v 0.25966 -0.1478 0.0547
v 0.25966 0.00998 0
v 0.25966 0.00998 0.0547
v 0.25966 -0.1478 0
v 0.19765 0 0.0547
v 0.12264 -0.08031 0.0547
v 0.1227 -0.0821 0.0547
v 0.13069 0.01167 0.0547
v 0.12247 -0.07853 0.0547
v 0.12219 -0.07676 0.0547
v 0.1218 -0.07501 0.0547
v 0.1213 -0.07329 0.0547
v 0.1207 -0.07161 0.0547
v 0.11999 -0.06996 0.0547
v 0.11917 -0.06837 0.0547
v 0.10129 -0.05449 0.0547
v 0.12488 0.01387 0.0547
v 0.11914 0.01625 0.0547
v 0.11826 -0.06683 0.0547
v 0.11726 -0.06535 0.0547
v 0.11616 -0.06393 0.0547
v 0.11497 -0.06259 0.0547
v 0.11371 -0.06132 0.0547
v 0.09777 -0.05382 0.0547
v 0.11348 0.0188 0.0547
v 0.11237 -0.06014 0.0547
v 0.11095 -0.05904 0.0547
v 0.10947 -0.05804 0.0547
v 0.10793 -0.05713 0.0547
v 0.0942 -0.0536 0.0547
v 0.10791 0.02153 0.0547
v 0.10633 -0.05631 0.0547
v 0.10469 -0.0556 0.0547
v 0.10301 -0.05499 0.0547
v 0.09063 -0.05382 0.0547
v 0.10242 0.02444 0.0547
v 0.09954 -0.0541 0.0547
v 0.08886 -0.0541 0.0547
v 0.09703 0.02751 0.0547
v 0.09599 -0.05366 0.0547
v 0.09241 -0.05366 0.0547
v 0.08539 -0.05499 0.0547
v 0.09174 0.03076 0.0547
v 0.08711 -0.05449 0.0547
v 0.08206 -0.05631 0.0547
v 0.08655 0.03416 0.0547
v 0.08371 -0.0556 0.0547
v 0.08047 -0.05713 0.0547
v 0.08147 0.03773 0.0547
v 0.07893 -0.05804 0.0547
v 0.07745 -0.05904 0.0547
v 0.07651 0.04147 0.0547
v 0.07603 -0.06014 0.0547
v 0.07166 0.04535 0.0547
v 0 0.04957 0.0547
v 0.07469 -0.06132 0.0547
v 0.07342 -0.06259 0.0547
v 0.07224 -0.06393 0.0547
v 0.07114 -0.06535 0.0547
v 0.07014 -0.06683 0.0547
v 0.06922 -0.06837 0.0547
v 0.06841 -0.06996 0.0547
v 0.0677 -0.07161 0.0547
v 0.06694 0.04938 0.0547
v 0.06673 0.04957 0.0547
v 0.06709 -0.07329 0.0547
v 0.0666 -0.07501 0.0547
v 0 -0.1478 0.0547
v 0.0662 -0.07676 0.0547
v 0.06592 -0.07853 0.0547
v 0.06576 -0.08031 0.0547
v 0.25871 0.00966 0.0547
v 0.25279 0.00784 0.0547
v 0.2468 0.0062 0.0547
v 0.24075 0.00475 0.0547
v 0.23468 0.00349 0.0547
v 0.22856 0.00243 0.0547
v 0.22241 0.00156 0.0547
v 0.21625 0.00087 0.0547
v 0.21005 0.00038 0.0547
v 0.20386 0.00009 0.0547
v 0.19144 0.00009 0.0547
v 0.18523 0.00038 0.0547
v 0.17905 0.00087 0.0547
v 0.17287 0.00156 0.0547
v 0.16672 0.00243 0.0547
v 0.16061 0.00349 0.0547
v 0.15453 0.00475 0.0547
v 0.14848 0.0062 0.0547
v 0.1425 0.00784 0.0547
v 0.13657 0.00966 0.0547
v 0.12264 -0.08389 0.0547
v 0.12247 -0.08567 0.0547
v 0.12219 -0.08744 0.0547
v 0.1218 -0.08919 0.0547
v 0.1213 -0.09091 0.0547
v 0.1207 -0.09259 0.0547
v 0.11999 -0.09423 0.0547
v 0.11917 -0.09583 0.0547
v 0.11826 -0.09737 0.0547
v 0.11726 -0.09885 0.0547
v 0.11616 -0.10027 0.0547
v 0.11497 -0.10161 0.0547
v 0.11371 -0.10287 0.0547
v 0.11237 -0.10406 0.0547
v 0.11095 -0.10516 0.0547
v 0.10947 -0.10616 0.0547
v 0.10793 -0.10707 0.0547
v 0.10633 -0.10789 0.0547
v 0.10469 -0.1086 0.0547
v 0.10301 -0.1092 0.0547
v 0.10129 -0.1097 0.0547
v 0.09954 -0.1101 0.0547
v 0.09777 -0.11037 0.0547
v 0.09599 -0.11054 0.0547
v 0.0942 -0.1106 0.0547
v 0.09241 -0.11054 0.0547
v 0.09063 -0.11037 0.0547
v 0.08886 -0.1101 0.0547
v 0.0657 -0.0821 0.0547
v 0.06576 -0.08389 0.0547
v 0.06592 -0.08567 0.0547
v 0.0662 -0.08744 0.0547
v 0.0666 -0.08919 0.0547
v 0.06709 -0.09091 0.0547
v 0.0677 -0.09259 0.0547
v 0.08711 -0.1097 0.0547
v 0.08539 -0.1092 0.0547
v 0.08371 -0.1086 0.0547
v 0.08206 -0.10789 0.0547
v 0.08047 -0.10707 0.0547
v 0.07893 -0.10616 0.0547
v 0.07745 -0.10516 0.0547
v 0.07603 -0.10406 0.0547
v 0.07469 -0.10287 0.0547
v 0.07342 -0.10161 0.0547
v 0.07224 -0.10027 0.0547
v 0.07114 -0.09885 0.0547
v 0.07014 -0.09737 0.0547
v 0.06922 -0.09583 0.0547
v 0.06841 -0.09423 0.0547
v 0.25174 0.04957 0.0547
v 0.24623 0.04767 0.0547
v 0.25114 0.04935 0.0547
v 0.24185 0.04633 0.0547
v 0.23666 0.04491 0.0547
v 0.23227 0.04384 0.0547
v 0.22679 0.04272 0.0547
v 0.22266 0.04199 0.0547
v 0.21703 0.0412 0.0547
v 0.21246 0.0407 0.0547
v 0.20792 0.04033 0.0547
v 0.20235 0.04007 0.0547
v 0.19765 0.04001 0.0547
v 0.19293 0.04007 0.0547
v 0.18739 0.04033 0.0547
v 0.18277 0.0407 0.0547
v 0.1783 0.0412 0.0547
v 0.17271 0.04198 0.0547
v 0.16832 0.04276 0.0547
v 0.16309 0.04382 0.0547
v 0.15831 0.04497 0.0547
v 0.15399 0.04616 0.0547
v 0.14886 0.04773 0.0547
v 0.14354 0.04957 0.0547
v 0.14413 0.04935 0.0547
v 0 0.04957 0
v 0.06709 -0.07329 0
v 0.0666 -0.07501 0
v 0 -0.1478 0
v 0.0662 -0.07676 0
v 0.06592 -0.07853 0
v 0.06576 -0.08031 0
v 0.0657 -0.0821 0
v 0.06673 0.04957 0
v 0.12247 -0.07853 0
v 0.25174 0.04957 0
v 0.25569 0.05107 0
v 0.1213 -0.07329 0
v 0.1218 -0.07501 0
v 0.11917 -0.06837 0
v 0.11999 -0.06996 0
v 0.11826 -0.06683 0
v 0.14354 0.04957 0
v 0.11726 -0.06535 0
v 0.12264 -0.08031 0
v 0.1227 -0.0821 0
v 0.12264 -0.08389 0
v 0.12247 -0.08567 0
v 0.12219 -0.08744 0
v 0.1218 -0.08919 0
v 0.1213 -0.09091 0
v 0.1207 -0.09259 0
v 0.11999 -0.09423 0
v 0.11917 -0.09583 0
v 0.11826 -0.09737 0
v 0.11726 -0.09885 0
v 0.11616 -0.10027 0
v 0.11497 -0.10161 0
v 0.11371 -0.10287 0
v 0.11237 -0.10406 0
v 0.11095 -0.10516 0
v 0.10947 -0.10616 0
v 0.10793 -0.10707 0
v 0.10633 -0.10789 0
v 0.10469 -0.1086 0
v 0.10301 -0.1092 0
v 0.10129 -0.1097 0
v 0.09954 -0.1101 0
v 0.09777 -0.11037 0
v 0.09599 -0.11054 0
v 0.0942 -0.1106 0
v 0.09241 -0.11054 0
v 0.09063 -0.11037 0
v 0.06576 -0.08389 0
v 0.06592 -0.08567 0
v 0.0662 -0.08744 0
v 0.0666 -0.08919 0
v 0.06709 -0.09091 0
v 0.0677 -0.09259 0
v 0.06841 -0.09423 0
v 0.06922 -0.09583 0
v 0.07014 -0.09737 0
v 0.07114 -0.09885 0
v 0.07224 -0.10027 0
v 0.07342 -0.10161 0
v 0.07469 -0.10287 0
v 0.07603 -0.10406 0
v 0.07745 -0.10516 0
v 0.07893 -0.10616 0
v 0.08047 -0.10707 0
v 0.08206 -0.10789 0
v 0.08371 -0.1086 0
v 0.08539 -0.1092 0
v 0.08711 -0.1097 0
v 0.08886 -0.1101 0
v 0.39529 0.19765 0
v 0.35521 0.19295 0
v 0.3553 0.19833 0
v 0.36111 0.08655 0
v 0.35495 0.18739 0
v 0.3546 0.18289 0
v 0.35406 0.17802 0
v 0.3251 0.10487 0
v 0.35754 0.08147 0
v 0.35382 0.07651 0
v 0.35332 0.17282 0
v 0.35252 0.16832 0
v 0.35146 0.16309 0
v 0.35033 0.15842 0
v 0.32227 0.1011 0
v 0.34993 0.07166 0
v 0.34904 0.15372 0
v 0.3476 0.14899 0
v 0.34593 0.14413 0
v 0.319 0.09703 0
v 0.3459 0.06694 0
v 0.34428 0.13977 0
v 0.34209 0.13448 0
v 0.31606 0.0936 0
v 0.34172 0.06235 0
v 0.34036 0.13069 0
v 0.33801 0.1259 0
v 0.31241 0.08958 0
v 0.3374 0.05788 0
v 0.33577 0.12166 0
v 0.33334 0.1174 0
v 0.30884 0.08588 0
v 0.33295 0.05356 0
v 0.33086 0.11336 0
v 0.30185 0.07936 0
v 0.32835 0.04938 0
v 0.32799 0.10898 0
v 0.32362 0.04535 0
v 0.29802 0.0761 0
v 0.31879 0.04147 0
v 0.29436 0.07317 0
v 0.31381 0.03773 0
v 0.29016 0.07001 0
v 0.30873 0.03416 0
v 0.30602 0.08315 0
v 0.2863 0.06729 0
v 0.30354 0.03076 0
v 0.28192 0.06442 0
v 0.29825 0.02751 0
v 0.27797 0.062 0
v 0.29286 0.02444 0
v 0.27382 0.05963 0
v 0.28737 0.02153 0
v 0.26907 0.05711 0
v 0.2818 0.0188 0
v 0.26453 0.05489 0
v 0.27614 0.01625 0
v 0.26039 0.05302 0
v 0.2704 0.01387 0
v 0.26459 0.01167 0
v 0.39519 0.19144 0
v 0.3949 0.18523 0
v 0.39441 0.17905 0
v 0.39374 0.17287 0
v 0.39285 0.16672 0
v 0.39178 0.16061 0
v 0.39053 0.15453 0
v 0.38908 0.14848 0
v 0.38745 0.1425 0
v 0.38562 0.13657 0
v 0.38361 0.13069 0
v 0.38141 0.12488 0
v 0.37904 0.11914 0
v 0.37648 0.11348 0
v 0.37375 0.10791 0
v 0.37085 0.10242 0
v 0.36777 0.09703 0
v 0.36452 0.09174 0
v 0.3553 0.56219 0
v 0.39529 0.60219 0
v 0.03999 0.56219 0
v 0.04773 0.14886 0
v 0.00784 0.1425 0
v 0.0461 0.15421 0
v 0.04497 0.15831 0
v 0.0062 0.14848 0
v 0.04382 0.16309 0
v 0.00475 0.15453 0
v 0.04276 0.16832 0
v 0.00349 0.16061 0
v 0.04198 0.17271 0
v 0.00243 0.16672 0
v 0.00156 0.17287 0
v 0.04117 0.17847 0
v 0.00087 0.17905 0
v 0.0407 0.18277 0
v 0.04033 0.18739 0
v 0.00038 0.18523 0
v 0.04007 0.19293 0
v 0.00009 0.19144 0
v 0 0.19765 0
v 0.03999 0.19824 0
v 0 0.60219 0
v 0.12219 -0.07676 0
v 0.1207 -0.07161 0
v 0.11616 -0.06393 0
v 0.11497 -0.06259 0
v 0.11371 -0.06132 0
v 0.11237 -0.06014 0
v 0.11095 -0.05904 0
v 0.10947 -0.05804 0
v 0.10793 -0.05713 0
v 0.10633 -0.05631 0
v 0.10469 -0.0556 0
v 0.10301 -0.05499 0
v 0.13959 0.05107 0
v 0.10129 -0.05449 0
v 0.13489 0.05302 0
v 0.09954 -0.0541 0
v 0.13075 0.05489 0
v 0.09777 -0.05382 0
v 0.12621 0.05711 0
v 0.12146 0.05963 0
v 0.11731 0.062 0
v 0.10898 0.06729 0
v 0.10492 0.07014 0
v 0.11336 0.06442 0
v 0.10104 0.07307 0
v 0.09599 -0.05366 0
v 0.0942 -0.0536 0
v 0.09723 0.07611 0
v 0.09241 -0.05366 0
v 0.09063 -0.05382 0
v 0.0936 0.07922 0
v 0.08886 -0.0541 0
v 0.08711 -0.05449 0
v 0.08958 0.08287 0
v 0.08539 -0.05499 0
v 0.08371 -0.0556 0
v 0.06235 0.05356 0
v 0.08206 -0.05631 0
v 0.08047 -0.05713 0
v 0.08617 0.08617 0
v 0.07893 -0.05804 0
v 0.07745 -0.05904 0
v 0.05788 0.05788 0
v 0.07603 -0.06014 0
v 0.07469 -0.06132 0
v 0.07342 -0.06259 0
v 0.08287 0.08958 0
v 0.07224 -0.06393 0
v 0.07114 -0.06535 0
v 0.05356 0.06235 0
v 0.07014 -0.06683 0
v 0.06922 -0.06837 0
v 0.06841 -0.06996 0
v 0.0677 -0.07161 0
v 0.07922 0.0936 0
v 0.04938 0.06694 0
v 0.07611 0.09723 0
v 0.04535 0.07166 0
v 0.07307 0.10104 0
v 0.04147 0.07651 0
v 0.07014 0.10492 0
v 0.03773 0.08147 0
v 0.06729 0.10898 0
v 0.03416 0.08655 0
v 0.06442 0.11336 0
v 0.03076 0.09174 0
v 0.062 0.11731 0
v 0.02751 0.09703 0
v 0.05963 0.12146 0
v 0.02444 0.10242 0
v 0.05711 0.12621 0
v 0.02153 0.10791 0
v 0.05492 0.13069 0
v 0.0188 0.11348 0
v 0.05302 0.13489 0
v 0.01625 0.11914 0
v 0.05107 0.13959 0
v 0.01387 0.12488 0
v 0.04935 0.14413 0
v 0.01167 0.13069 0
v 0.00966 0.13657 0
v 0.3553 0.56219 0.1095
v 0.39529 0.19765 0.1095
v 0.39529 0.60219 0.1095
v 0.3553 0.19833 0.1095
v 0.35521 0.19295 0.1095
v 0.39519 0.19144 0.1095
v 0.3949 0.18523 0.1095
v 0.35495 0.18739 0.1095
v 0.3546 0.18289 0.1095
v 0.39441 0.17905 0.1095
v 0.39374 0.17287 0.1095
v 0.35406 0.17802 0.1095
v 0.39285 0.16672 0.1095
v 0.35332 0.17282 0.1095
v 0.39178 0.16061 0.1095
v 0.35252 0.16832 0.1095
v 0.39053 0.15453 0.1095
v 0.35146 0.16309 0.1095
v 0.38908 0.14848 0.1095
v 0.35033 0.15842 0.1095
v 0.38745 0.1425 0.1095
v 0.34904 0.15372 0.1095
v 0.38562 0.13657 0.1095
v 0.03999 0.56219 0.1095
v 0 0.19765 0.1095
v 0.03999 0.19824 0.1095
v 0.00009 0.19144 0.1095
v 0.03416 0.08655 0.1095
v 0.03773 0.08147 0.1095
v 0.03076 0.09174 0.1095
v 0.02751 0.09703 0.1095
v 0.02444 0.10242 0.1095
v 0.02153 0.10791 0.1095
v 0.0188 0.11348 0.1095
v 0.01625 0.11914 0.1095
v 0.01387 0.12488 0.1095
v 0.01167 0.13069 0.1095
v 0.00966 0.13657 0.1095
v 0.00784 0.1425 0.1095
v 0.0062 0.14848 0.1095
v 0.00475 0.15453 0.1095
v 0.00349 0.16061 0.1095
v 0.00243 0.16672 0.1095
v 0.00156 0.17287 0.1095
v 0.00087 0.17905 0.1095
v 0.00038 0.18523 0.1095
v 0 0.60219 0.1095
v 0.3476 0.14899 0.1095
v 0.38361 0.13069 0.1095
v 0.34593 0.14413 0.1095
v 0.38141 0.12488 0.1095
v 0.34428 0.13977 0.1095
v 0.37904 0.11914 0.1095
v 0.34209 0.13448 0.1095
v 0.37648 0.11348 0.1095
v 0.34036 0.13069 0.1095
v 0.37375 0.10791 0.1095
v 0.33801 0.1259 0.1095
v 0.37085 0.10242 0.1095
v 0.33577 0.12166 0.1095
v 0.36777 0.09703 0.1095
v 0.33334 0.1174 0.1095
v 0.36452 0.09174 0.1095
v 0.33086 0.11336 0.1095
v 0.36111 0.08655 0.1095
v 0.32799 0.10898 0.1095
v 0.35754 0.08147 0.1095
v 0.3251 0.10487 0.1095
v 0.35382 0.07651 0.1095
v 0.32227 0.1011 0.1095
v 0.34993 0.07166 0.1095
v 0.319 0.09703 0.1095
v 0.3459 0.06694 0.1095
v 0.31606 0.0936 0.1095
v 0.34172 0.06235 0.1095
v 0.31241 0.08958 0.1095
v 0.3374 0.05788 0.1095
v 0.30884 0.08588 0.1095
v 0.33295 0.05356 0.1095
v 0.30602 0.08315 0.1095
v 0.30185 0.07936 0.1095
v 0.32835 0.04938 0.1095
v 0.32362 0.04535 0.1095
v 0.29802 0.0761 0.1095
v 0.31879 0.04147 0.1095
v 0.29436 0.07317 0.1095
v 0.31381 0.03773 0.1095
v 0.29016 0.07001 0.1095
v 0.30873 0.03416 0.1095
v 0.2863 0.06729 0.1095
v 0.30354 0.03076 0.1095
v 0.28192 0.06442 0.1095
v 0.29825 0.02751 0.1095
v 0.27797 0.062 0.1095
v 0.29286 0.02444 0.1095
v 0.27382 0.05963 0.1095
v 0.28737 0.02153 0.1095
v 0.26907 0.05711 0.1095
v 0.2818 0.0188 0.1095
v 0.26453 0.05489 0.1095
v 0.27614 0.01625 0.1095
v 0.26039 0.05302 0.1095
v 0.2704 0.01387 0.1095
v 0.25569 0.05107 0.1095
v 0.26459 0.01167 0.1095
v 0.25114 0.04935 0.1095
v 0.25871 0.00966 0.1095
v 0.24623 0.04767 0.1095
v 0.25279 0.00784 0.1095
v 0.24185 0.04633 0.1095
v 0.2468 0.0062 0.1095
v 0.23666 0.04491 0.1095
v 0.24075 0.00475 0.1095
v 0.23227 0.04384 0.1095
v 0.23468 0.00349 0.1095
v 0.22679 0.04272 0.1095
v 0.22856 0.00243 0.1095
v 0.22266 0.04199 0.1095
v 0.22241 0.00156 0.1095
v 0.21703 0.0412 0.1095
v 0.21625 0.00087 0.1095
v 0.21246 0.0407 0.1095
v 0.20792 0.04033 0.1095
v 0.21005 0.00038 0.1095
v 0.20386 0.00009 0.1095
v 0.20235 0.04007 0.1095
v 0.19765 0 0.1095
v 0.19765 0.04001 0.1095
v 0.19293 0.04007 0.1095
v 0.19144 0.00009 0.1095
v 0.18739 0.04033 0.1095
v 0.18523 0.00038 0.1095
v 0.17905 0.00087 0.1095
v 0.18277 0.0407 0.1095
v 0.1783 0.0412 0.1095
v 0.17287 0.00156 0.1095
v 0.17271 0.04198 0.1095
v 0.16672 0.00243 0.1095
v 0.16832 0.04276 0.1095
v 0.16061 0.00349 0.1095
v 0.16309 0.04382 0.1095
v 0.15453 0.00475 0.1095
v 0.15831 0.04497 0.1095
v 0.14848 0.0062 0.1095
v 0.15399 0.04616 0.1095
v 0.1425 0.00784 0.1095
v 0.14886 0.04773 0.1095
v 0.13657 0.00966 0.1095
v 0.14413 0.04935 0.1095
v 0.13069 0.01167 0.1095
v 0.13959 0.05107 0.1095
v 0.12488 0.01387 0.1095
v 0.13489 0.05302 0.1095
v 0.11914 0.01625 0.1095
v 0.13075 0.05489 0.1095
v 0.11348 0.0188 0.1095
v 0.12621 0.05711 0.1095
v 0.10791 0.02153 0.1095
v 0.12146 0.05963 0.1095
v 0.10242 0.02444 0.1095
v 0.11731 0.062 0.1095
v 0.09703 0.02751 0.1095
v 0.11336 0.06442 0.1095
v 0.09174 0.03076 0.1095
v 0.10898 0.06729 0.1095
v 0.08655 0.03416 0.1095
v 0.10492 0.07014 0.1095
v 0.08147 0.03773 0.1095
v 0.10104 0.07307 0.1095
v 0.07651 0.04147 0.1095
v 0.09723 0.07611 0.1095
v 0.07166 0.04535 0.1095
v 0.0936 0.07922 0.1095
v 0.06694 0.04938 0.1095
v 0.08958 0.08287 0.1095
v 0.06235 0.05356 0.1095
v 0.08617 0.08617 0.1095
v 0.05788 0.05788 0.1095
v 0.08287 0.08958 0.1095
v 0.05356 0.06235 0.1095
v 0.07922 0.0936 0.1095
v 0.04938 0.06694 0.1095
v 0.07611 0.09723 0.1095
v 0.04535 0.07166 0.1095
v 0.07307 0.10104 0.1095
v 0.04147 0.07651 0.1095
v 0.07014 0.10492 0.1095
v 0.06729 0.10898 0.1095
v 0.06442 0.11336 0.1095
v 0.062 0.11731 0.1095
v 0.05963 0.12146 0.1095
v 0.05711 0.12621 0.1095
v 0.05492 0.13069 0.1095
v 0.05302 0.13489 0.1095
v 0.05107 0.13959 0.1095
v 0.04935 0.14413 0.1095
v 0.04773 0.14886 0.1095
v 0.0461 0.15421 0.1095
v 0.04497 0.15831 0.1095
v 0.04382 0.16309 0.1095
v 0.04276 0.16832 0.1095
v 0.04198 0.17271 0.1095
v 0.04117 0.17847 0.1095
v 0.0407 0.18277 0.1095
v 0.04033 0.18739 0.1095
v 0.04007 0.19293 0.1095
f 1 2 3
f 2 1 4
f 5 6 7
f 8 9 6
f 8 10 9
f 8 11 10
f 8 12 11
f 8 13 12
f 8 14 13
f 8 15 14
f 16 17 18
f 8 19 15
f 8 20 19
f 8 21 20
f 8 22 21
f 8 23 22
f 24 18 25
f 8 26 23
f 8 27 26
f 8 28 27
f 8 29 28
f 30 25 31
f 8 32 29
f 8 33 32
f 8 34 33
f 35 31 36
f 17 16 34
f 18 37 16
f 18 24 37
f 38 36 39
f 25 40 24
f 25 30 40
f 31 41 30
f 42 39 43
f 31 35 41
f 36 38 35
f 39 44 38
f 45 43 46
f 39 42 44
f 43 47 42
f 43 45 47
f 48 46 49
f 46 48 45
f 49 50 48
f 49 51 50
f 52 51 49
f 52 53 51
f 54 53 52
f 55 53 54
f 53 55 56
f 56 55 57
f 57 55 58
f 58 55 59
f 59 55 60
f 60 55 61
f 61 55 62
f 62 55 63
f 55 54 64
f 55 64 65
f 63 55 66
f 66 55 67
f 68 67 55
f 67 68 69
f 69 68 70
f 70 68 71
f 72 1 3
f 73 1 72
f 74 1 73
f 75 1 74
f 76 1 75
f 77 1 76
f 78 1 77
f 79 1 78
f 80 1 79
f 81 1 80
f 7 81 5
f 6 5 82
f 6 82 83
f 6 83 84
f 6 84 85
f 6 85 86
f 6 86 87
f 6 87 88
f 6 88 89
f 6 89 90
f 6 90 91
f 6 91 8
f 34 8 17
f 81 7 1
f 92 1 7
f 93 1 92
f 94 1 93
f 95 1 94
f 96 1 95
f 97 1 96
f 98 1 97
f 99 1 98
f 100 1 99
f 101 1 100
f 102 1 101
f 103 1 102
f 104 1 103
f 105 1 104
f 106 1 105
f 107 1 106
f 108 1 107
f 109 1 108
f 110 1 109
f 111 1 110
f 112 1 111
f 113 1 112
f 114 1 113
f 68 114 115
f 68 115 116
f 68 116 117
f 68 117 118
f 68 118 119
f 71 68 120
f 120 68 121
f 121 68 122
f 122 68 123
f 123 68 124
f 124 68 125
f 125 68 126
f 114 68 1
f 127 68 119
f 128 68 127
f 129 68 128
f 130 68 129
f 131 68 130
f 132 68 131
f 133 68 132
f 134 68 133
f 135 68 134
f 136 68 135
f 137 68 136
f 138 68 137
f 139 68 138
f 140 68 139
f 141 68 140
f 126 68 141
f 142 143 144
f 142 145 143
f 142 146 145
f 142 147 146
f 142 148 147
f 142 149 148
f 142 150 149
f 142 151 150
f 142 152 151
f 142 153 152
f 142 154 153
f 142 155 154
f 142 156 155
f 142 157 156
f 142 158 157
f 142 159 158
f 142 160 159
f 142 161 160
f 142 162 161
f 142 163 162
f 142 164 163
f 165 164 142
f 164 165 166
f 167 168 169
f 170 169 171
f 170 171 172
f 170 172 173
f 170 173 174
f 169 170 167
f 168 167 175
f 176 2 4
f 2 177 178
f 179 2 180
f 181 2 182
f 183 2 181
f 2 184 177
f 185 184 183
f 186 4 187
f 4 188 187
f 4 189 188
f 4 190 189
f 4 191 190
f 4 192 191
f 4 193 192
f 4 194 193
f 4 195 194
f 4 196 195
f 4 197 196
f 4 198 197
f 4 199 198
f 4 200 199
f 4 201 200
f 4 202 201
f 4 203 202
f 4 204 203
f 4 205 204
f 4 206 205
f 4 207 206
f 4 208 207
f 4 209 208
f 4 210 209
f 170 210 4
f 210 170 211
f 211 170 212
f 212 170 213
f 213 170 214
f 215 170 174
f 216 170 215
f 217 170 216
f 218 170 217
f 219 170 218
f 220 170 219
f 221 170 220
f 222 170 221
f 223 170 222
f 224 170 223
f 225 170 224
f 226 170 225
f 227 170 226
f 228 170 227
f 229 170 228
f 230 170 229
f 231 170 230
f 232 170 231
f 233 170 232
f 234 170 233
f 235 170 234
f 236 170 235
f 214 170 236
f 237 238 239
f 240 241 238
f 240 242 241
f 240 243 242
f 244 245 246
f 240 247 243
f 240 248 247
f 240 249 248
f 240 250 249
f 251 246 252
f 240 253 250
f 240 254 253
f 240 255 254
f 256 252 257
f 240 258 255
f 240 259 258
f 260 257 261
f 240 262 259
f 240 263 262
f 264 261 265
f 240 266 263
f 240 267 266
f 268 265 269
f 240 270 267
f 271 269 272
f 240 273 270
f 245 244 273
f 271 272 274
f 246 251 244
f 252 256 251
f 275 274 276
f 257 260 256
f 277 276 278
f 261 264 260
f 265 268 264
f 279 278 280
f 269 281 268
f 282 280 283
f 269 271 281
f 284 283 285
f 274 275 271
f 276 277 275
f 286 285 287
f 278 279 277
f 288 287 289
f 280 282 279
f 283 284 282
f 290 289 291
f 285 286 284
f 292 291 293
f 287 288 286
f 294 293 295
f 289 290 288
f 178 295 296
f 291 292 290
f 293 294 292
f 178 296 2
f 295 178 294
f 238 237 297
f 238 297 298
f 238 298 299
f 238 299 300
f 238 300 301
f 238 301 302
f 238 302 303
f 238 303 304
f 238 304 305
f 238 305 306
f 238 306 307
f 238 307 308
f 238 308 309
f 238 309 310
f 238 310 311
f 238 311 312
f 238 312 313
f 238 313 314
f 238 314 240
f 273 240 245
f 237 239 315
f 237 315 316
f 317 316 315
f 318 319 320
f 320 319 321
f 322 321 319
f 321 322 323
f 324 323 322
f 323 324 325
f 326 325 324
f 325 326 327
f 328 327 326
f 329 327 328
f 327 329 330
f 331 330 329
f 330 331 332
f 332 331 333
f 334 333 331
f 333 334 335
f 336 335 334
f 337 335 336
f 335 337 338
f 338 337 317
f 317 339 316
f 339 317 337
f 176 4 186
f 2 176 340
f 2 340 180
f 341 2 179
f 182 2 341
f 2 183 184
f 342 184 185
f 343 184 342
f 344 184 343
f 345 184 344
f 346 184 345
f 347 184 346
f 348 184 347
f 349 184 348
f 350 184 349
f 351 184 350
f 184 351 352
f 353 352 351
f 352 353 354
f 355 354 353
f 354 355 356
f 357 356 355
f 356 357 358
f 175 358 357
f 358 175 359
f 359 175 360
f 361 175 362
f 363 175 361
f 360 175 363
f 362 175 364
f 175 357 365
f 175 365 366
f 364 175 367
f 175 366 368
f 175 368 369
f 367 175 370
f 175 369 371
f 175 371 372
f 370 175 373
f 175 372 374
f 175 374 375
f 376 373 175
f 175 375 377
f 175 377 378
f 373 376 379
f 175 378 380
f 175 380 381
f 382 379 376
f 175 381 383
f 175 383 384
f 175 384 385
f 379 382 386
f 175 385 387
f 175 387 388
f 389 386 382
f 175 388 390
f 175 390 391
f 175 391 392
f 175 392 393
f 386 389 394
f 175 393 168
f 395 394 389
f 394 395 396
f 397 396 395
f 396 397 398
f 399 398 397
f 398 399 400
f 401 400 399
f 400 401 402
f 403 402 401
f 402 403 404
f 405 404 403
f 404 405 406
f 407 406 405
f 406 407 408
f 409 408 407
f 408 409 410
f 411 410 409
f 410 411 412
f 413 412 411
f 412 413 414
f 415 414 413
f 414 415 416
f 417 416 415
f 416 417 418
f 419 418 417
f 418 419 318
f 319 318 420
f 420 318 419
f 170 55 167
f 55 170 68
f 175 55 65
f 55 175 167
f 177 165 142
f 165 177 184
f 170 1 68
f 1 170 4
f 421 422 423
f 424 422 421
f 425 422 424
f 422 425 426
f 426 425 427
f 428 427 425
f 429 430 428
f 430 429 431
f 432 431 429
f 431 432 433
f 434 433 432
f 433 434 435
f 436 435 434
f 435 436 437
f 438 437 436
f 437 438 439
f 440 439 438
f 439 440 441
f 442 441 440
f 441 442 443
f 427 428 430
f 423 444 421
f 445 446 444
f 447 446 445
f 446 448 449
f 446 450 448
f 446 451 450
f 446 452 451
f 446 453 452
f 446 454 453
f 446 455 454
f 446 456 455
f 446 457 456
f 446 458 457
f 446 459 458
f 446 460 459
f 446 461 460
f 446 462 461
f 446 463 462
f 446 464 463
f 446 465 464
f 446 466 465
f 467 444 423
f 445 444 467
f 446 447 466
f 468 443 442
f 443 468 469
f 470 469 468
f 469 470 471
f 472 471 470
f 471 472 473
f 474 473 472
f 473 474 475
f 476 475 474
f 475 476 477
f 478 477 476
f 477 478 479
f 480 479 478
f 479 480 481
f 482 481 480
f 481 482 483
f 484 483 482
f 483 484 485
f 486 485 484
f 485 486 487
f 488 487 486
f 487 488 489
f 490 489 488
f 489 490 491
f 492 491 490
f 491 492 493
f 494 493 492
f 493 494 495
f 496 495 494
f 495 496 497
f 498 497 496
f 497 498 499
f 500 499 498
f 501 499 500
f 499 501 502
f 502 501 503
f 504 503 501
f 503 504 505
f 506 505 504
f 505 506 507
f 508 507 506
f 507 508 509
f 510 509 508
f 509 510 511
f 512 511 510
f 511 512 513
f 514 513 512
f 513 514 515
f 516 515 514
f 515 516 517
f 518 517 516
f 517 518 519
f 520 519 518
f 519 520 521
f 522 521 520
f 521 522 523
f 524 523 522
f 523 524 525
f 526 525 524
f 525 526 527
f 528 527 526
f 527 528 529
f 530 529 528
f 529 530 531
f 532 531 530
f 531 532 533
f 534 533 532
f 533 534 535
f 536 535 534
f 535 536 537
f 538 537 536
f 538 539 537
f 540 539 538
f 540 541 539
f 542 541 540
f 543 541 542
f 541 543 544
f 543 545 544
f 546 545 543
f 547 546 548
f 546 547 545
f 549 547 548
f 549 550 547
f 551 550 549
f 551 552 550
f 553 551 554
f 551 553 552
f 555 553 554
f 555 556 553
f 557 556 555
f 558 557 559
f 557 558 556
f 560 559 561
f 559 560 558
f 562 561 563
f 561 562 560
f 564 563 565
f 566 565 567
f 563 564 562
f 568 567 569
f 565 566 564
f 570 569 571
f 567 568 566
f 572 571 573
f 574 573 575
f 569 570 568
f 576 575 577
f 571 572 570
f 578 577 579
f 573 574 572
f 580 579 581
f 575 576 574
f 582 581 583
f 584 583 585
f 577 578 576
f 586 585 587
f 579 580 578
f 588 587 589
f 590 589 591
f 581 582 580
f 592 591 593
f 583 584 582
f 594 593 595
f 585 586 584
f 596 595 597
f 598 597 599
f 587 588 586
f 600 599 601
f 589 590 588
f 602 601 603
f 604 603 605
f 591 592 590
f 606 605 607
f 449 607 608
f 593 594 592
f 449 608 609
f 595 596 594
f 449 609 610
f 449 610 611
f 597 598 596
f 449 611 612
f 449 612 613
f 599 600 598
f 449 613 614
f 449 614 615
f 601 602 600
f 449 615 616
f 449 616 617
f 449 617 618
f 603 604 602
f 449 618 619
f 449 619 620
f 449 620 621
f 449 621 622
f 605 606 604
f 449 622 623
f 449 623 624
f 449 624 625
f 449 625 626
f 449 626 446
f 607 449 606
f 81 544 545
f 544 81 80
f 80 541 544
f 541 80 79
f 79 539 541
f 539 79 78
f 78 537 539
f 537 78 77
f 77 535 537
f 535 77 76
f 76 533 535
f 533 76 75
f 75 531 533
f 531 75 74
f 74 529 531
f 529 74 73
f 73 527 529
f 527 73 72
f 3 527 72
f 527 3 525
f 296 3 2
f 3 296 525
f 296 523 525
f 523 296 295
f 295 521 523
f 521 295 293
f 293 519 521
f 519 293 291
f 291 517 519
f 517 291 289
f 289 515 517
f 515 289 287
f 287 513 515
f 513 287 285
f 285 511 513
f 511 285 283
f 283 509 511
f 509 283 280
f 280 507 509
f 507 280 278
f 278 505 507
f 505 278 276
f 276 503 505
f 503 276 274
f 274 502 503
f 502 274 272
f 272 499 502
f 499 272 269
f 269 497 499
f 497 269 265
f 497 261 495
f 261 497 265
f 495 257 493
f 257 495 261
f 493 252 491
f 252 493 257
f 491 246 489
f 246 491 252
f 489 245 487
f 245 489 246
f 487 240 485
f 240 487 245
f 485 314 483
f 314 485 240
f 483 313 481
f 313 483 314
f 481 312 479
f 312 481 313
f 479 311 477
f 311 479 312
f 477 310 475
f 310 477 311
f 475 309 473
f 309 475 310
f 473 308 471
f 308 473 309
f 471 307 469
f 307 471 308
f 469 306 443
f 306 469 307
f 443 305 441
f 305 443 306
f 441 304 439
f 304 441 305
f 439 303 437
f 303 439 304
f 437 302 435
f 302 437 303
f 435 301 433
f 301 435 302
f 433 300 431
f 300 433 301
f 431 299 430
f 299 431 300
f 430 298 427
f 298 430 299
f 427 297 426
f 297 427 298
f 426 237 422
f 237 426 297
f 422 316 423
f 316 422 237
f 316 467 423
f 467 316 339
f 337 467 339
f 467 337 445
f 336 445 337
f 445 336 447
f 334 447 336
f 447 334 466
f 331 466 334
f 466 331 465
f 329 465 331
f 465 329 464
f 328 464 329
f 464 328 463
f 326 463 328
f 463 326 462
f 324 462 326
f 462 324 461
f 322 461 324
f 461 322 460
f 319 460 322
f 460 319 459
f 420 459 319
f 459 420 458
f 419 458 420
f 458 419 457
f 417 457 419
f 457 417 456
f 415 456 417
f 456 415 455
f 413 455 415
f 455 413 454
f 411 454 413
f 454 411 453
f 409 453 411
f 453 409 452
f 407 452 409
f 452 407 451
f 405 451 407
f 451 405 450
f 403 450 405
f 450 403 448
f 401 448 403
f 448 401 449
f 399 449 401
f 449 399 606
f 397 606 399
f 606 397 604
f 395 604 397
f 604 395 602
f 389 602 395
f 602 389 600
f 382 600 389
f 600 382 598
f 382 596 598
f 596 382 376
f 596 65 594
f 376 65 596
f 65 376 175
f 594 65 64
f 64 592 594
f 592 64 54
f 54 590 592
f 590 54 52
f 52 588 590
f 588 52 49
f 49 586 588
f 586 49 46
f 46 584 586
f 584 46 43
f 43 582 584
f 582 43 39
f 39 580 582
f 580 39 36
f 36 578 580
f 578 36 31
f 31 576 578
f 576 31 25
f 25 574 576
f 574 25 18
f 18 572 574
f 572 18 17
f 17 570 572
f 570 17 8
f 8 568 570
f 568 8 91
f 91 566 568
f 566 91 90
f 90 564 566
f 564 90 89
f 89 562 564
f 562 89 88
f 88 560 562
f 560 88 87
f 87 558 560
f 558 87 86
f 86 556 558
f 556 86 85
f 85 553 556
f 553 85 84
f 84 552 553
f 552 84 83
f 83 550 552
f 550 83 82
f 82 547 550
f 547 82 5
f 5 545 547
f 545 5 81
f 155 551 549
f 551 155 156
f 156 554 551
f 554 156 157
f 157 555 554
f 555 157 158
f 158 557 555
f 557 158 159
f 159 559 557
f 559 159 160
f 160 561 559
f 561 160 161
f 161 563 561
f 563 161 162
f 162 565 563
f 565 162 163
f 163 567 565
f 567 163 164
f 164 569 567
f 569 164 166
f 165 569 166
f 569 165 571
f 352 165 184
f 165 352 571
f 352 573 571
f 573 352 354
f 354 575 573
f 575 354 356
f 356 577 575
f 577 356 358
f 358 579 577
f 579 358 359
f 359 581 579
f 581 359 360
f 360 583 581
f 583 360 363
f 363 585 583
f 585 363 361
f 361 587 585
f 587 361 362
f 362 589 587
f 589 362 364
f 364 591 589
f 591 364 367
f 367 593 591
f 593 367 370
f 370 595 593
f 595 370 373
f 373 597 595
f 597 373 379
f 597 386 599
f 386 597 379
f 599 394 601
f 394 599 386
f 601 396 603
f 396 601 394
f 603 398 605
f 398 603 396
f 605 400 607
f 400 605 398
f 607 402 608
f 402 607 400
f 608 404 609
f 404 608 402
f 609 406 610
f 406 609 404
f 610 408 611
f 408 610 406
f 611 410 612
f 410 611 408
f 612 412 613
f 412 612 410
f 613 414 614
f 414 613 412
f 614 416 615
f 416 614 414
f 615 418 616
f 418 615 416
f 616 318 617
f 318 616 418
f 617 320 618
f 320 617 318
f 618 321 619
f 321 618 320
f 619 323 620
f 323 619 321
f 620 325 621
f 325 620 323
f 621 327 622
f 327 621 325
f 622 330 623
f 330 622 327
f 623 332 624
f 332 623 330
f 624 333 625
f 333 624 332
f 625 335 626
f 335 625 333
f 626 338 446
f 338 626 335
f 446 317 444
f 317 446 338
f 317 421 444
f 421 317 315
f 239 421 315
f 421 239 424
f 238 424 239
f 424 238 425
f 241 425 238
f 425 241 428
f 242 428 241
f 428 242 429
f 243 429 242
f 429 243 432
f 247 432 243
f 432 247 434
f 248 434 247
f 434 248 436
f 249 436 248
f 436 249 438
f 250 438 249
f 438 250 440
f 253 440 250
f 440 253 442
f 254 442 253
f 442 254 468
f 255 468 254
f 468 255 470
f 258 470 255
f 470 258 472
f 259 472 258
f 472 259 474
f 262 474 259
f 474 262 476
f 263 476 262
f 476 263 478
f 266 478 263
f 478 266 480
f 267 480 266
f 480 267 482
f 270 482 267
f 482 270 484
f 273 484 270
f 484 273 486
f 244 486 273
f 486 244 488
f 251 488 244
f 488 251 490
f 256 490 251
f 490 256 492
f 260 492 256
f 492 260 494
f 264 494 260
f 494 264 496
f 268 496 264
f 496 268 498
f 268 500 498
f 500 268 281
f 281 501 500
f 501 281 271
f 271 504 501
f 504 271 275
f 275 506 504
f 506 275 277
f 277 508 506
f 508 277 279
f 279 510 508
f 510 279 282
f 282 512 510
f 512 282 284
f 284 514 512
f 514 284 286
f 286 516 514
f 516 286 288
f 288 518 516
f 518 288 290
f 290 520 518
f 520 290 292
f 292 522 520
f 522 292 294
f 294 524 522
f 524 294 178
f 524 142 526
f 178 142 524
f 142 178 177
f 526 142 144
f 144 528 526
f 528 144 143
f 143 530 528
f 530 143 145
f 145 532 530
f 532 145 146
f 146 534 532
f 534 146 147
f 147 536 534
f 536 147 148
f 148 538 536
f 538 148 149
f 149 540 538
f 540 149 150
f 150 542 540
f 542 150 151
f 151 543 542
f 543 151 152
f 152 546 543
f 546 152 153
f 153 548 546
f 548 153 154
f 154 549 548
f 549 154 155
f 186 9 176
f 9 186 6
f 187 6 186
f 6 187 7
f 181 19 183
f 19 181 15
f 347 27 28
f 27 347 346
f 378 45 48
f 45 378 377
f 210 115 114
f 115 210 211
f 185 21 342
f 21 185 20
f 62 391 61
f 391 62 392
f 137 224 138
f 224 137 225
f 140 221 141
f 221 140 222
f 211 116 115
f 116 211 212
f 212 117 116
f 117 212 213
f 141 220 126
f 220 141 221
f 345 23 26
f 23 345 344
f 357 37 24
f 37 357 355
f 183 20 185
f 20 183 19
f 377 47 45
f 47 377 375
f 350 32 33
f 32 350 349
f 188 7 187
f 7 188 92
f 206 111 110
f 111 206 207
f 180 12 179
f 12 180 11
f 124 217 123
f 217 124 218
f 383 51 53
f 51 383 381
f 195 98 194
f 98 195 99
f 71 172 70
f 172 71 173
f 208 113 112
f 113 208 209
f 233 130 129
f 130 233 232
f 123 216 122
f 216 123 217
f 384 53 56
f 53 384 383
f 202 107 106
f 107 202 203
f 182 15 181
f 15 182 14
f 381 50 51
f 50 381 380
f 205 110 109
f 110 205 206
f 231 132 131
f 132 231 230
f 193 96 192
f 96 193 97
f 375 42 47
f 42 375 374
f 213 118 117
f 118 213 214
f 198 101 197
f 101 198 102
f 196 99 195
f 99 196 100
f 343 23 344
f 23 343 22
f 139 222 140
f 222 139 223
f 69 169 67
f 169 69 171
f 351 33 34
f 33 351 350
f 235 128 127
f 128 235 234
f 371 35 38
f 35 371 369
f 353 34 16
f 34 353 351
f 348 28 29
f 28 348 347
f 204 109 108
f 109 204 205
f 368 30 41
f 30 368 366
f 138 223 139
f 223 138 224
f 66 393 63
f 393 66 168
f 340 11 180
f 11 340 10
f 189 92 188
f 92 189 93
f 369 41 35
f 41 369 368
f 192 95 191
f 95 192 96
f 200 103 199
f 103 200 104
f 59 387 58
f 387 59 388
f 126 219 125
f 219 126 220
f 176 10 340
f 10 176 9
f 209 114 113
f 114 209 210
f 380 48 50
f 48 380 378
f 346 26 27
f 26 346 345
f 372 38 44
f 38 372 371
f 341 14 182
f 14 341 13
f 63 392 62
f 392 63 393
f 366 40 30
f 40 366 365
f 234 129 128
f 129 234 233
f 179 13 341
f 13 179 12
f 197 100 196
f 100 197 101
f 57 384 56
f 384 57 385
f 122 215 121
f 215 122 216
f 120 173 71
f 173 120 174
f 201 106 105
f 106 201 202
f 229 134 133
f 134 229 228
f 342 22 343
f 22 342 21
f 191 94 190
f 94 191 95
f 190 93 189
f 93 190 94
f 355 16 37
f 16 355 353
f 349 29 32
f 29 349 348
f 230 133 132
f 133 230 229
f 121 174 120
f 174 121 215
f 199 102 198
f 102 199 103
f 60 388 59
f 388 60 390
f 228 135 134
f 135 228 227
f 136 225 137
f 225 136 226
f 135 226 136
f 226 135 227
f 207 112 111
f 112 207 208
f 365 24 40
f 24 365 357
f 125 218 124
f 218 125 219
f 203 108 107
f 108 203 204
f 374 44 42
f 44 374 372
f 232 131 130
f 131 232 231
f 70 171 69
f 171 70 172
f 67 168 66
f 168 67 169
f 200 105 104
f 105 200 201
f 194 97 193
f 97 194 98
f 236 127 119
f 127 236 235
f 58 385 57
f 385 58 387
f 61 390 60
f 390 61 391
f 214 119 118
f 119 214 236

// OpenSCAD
// D-Shaped Frame with Shallow Round Protrusion

// Main base dimensions
main_length = 0.3953;
main_width = 0.6022;
main_height = 0.1095;

// Frame wall thickness for inner through-opening
wall_thickness = 0.04;

// Shallow protrusion overall footprint
prot_length = 0.259658;
prot_width = 0.197373;
prot_height = 0.0547;
prot_left = 0;
prot_front = -0.1478;

// Circular portion of protrusion (coaxial with cut)
circ_x = 0.0942;
circ_y = -0.0821;
circ_radius = 0.0657;

// Concentric circular cut through shallow band
cut_radius = 0.0285;

$fn = 100;

// 2D D-shape: semicircular front arc with straight sides and rear
module d_shape_2d(l, w) {
    r = l / 2;
    n = $fn;
    // Semicircular arc from left through bottom to right
    arc_pts = [for (i = [0 : n]) let(a = 180 + i * 180 / n)
               [r + r * cos(a), r + r * sin(a)]];
    // Close polygon with back edge corners
    pts = concat(arc_pts, [[l, w], [0, w]]);
    polygon(pts);
}

// 2D D-shaped frame: outer D-shape minus offset inner opening
module d_frame_2d(l, w, wt) {
    difference() {
        d_shape_2d(l, w);
        offset(delta = -wt)
            d_shape_2d(l, w);
    }
}

// Assemble final model
difference() {
    union() {
        // Main D-shaped frame, full extrusion depth
        linear_extrude(main_height)
            d_frame_2d(main_length, main_width, wall_thickness);

        // Shallow protrusion: rectangular pad plus circular tab
        union() {
            translate([prot_left, prot_front, 0])
                cube([prot_length, prot_width, prot_height]);
            translate([circ_x, circ_y, 0])
                cylinder(r = circ_radius, h = prot_height);
        }
    }

    // Concentric circular cut through shallow band only
    translate([circ_x, circ_y, 0])
        cylinder(r = cut_radius, h = prot_height);
}
